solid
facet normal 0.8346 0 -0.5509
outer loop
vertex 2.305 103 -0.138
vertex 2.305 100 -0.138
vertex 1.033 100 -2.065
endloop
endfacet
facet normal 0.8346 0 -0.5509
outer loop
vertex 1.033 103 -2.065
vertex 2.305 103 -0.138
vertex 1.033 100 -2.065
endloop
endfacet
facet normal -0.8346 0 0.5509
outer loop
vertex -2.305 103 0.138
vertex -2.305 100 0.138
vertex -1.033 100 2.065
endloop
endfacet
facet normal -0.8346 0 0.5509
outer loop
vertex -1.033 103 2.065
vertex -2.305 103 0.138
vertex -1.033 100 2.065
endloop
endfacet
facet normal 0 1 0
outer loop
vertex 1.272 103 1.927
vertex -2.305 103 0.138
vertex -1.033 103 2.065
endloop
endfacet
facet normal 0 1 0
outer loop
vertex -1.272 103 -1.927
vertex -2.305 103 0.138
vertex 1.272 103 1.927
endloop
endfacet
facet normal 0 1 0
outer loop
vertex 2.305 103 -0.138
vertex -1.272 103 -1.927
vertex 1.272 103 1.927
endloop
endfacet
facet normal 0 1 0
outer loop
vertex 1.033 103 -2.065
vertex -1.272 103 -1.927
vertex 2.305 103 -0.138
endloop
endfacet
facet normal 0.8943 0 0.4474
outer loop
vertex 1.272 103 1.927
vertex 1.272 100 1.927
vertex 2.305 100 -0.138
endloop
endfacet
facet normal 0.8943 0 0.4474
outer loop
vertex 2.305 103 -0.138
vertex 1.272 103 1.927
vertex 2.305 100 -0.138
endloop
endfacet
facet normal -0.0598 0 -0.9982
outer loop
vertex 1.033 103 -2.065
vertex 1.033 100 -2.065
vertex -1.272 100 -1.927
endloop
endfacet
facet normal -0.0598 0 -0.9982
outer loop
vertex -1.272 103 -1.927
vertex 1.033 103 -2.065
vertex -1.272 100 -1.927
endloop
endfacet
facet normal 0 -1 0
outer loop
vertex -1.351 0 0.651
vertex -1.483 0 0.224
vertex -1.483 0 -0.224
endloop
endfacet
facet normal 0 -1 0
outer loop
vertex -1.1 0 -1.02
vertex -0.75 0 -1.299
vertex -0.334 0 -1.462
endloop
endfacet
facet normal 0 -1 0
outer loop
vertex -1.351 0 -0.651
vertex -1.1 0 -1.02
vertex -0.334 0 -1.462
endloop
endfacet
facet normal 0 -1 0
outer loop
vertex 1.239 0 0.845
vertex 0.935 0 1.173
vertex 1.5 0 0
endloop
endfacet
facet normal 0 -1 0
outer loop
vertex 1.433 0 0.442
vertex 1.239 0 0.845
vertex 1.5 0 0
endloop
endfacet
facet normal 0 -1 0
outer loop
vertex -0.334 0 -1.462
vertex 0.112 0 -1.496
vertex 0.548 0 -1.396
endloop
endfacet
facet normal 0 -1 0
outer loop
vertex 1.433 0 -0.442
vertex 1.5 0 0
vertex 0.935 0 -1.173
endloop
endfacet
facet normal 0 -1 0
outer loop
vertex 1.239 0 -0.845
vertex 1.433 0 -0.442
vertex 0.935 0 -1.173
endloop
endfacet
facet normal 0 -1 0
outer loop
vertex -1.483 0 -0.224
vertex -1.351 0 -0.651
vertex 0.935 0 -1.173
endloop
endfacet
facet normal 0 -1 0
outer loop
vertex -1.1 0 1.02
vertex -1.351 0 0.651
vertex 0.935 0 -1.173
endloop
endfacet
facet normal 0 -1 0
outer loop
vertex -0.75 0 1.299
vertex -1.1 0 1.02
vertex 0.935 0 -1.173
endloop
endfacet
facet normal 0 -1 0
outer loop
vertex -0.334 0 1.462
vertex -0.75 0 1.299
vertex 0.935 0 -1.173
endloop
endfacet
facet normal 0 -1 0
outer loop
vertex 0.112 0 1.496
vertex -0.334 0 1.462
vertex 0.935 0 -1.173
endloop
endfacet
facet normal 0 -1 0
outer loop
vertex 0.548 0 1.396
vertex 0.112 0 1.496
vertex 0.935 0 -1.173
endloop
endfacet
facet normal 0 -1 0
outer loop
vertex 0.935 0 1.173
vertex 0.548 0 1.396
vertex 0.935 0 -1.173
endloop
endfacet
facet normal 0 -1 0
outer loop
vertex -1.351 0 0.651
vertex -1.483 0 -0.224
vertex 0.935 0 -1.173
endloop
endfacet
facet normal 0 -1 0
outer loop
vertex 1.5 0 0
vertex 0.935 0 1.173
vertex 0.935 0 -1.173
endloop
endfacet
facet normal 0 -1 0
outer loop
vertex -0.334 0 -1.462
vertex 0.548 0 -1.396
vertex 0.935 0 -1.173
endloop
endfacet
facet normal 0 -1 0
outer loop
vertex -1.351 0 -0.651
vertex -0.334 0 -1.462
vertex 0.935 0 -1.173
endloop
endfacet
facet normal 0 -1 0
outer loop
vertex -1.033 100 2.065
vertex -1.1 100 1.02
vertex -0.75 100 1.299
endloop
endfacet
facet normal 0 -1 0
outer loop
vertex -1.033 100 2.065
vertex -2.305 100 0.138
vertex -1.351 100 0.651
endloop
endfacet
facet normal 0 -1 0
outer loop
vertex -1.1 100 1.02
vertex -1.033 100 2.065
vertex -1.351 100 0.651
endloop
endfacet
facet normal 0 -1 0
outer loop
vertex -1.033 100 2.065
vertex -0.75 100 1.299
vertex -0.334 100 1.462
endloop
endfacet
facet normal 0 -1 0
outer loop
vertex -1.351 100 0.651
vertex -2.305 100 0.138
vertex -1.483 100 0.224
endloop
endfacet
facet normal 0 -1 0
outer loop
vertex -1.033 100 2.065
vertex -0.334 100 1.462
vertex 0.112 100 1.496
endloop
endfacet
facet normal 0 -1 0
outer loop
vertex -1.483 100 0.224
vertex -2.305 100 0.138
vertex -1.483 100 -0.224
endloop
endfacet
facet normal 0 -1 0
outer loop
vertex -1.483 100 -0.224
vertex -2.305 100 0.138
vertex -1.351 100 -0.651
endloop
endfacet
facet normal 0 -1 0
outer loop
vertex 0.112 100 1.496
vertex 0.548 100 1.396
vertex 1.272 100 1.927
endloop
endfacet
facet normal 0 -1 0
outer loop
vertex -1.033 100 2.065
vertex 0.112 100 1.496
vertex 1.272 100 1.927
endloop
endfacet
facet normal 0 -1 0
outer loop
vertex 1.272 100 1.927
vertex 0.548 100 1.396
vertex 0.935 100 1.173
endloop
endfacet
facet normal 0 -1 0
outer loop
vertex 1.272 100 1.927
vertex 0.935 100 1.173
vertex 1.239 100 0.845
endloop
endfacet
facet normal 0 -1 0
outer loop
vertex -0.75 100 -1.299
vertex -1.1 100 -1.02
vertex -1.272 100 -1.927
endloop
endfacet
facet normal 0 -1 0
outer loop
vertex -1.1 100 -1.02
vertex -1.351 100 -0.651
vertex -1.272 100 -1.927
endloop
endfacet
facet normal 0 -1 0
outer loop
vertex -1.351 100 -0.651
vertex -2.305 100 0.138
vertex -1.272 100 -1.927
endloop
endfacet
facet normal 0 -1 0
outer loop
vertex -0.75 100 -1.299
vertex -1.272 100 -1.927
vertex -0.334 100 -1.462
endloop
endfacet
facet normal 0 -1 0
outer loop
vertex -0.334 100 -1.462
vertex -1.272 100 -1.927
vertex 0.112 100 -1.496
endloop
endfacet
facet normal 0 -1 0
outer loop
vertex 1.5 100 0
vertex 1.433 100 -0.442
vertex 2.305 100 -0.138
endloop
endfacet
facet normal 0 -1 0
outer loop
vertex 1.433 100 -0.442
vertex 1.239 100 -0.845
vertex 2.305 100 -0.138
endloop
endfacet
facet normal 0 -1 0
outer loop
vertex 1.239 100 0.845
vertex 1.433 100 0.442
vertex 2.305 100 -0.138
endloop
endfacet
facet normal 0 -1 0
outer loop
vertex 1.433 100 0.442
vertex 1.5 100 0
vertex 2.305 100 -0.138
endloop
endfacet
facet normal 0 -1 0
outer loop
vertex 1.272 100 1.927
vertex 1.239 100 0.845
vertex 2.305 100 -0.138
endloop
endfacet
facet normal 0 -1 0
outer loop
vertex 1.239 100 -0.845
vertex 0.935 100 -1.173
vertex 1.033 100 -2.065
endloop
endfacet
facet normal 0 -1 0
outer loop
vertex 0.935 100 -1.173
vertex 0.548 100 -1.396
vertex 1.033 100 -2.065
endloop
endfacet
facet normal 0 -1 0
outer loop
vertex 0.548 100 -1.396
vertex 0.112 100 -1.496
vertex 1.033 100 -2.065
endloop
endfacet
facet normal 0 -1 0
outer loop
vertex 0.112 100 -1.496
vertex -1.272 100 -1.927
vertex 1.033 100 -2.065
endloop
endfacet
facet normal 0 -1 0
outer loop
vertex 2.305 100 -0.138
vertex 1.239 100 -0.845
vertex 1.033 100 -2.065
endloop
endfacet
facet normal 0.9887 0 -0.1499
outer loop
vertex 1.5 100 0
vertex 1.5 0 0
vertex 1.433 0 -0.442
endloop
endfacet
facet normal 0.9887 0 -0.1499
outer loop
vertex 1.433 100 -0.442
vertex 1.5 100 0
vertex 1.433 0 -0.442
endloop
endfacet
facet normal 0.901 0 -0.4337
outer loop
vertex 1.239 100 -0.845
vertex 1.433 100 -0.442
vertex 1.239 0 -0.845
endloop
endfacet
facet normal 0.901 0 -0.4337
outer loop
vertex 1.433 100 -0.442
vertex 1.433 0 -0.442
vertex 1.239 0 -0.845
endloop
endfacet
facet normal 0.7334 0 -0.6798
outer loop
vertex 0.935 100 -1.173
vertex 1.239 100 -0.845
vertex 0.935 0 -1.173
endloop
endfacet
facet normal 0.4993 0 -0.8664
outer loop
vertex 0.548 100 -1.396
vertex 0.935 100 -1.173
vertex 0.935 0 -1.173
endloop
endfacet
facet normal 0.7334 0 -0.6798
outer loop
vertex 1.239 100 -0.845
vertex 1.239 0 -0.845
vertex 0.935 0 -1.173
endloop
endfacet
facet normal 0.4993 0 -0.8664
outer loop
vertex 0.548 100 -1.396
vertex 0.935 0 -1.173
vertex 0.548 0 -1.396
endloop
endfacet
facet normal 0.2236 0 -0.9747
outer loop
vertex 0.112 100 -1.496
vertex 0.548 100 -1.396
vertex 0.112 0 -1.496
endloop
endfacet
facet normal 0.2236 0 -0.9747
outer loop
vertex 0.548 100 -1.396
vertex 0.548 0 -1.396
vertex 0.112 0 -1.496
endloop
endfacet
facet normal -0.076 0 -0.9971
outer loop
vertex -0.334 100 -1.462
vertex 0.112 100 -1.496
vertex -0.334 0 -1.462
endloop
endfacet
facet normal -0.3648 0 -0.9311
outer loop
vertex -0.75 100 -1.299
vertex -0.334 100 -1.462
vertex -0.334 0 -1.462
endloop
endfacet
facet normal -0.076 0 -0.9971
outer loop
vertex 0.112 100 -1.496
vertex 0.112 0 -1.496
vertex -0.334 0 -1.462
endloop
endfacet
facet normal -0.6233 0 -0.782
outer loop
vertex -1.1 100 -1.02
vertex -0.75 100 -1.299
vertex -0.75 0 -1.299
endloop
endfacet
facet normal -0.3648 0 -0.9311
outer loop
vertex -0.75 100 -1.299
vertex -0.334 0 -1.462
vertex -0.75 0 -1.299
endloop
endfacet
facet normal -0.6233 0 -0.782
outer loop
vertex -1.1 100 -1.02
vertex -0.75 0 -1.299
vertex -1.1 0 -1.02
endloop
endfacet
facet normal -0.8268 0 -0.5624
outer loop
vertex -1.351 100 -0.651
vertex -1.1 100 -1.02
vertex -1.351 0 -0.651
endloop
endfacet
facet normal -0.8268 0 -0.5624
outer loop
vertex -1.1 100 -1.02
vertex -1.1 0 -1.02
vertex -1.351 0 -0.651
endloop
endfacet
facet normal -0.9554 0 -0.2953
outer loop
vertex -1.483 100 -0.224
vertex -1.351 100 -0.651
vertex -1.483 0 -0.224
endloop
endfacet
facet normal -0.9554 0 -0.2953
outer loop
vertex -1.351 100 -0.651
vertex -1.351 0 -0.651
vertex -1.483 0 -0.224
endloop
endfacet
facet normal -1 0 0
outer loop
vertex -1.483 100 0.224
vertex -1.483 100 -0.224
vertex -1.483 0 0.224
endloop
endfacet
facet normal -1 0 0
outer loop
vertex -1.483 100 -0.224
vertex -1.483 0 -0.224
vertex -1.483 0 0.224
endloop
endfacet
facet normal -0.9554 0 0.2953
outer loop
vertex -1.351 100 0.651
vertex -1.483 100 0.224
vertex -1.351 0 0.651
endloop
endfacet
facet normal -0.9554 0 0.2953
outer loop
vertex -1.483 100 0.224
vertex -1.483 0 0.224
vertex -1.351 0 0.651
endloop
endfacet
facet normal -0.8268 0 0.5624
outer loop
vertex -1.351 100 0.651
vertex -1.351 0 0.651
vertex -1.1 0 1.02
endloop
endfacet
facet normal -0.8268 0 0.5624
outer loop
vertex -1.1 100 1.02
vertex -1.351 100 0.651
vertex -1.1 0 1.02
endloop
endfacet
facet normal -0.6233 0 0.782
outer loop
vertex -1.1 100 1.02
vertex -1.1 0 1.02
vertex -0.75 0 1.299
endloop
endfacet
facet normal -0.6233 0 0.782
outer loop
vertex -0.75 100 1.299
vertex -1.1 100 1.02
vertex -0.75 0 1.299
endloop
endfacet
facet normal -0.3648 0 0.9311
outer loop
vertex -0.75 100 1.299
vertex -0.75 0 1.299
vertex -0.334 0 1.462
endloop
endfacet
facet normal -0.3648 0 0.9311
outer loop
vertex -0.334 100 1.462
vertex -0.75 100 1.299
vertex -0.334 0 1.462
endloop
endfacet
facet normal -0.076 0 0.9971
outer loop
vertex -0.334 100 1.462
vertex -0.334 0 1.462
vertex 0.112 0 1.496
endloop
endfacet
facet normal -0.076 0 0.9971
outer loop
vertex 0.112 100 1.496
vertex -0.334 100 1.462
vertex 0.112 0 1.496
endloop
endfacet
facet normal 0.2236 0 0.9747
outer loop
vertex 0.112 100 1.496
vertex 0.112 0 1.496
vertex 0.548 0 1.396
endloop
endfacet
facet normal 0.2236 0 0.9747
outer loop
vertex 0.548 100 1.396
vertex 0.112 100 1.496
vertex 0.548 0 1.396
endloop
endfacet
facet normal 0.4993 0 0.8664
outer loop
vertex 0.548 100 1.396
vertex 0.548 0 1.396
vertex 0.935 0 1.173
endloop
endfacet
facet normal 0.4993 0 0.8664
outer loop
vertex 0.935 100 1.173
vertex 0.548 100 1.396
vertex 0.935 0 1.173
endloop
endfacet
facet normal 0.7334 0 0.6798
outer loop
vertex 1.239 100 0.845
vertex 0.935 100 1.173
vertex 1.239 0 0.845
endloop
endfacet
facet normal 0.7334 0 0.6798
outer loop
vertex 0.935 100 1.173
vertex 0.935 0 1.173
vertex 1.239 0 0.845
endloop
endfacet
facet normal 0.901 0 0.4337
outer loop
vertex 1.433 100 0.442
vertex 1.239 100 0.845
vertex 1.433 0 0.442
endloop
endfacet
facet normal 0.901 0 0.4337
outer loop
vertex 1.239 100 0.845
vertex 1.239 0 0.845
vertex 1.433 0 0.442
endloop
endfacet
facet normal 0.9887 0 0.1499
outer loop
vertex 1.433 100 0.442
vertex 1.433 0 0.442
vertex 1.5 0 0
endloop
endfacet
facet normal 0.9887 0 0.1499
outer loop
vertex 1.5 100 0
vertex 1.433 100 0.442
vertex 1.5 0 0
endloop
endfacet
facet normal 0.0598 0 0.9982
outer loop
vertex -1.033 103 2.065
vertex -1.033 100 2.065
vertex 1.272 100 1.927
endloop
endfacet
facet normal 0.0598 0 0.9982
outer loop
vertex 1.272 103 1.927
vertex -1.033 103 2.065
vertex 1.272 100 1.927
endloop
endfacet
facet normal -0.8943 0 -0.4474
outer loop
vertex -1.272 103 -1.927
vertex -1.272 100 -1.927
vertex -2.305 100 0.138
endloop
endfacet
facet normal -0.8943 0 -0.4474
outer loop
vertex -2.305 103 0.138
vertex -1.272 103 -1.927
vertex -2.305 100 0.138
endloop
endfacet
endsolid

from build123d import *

# Parameters (mm, degrees)
SKETCH2_R           = 1.5
BOSS_EXTRUDE1_DEPTH = 100
BOSS_EXTRUDE2_DEPTH = 3


with BuildPart() as part:
    # Sketch2 → Boss-Extrude1 (new body)
    with BuildSketch(Plane(origin=(0, 0, 0), x_dir=(1, 0, 0), z_dir=(0, 1, 0))):
        Circle(SKETCH2_R)
    extrude(amount=BOSS_EXTRUDE1_DEPTH)

    # Sketch3 → Boss-Extrude2 (add)
    with BuildSketch(Plane(origin=(0, 100, 0), x_dir=(1, 0, 0), z_dir=(0, 1, 0))):
        Polygon((-2.305280672, -0.137892556), (-1.03322188, -2.065377903), (1.272058792, -1.927485347), (2.305280672, 0.137892556), (1.03322188, 2.065377903), (-1.272058792, 1.927485347), align=None)
    extrude(amount=BOSS_EXTRUDE2_DEPTH)


solid = part.part
